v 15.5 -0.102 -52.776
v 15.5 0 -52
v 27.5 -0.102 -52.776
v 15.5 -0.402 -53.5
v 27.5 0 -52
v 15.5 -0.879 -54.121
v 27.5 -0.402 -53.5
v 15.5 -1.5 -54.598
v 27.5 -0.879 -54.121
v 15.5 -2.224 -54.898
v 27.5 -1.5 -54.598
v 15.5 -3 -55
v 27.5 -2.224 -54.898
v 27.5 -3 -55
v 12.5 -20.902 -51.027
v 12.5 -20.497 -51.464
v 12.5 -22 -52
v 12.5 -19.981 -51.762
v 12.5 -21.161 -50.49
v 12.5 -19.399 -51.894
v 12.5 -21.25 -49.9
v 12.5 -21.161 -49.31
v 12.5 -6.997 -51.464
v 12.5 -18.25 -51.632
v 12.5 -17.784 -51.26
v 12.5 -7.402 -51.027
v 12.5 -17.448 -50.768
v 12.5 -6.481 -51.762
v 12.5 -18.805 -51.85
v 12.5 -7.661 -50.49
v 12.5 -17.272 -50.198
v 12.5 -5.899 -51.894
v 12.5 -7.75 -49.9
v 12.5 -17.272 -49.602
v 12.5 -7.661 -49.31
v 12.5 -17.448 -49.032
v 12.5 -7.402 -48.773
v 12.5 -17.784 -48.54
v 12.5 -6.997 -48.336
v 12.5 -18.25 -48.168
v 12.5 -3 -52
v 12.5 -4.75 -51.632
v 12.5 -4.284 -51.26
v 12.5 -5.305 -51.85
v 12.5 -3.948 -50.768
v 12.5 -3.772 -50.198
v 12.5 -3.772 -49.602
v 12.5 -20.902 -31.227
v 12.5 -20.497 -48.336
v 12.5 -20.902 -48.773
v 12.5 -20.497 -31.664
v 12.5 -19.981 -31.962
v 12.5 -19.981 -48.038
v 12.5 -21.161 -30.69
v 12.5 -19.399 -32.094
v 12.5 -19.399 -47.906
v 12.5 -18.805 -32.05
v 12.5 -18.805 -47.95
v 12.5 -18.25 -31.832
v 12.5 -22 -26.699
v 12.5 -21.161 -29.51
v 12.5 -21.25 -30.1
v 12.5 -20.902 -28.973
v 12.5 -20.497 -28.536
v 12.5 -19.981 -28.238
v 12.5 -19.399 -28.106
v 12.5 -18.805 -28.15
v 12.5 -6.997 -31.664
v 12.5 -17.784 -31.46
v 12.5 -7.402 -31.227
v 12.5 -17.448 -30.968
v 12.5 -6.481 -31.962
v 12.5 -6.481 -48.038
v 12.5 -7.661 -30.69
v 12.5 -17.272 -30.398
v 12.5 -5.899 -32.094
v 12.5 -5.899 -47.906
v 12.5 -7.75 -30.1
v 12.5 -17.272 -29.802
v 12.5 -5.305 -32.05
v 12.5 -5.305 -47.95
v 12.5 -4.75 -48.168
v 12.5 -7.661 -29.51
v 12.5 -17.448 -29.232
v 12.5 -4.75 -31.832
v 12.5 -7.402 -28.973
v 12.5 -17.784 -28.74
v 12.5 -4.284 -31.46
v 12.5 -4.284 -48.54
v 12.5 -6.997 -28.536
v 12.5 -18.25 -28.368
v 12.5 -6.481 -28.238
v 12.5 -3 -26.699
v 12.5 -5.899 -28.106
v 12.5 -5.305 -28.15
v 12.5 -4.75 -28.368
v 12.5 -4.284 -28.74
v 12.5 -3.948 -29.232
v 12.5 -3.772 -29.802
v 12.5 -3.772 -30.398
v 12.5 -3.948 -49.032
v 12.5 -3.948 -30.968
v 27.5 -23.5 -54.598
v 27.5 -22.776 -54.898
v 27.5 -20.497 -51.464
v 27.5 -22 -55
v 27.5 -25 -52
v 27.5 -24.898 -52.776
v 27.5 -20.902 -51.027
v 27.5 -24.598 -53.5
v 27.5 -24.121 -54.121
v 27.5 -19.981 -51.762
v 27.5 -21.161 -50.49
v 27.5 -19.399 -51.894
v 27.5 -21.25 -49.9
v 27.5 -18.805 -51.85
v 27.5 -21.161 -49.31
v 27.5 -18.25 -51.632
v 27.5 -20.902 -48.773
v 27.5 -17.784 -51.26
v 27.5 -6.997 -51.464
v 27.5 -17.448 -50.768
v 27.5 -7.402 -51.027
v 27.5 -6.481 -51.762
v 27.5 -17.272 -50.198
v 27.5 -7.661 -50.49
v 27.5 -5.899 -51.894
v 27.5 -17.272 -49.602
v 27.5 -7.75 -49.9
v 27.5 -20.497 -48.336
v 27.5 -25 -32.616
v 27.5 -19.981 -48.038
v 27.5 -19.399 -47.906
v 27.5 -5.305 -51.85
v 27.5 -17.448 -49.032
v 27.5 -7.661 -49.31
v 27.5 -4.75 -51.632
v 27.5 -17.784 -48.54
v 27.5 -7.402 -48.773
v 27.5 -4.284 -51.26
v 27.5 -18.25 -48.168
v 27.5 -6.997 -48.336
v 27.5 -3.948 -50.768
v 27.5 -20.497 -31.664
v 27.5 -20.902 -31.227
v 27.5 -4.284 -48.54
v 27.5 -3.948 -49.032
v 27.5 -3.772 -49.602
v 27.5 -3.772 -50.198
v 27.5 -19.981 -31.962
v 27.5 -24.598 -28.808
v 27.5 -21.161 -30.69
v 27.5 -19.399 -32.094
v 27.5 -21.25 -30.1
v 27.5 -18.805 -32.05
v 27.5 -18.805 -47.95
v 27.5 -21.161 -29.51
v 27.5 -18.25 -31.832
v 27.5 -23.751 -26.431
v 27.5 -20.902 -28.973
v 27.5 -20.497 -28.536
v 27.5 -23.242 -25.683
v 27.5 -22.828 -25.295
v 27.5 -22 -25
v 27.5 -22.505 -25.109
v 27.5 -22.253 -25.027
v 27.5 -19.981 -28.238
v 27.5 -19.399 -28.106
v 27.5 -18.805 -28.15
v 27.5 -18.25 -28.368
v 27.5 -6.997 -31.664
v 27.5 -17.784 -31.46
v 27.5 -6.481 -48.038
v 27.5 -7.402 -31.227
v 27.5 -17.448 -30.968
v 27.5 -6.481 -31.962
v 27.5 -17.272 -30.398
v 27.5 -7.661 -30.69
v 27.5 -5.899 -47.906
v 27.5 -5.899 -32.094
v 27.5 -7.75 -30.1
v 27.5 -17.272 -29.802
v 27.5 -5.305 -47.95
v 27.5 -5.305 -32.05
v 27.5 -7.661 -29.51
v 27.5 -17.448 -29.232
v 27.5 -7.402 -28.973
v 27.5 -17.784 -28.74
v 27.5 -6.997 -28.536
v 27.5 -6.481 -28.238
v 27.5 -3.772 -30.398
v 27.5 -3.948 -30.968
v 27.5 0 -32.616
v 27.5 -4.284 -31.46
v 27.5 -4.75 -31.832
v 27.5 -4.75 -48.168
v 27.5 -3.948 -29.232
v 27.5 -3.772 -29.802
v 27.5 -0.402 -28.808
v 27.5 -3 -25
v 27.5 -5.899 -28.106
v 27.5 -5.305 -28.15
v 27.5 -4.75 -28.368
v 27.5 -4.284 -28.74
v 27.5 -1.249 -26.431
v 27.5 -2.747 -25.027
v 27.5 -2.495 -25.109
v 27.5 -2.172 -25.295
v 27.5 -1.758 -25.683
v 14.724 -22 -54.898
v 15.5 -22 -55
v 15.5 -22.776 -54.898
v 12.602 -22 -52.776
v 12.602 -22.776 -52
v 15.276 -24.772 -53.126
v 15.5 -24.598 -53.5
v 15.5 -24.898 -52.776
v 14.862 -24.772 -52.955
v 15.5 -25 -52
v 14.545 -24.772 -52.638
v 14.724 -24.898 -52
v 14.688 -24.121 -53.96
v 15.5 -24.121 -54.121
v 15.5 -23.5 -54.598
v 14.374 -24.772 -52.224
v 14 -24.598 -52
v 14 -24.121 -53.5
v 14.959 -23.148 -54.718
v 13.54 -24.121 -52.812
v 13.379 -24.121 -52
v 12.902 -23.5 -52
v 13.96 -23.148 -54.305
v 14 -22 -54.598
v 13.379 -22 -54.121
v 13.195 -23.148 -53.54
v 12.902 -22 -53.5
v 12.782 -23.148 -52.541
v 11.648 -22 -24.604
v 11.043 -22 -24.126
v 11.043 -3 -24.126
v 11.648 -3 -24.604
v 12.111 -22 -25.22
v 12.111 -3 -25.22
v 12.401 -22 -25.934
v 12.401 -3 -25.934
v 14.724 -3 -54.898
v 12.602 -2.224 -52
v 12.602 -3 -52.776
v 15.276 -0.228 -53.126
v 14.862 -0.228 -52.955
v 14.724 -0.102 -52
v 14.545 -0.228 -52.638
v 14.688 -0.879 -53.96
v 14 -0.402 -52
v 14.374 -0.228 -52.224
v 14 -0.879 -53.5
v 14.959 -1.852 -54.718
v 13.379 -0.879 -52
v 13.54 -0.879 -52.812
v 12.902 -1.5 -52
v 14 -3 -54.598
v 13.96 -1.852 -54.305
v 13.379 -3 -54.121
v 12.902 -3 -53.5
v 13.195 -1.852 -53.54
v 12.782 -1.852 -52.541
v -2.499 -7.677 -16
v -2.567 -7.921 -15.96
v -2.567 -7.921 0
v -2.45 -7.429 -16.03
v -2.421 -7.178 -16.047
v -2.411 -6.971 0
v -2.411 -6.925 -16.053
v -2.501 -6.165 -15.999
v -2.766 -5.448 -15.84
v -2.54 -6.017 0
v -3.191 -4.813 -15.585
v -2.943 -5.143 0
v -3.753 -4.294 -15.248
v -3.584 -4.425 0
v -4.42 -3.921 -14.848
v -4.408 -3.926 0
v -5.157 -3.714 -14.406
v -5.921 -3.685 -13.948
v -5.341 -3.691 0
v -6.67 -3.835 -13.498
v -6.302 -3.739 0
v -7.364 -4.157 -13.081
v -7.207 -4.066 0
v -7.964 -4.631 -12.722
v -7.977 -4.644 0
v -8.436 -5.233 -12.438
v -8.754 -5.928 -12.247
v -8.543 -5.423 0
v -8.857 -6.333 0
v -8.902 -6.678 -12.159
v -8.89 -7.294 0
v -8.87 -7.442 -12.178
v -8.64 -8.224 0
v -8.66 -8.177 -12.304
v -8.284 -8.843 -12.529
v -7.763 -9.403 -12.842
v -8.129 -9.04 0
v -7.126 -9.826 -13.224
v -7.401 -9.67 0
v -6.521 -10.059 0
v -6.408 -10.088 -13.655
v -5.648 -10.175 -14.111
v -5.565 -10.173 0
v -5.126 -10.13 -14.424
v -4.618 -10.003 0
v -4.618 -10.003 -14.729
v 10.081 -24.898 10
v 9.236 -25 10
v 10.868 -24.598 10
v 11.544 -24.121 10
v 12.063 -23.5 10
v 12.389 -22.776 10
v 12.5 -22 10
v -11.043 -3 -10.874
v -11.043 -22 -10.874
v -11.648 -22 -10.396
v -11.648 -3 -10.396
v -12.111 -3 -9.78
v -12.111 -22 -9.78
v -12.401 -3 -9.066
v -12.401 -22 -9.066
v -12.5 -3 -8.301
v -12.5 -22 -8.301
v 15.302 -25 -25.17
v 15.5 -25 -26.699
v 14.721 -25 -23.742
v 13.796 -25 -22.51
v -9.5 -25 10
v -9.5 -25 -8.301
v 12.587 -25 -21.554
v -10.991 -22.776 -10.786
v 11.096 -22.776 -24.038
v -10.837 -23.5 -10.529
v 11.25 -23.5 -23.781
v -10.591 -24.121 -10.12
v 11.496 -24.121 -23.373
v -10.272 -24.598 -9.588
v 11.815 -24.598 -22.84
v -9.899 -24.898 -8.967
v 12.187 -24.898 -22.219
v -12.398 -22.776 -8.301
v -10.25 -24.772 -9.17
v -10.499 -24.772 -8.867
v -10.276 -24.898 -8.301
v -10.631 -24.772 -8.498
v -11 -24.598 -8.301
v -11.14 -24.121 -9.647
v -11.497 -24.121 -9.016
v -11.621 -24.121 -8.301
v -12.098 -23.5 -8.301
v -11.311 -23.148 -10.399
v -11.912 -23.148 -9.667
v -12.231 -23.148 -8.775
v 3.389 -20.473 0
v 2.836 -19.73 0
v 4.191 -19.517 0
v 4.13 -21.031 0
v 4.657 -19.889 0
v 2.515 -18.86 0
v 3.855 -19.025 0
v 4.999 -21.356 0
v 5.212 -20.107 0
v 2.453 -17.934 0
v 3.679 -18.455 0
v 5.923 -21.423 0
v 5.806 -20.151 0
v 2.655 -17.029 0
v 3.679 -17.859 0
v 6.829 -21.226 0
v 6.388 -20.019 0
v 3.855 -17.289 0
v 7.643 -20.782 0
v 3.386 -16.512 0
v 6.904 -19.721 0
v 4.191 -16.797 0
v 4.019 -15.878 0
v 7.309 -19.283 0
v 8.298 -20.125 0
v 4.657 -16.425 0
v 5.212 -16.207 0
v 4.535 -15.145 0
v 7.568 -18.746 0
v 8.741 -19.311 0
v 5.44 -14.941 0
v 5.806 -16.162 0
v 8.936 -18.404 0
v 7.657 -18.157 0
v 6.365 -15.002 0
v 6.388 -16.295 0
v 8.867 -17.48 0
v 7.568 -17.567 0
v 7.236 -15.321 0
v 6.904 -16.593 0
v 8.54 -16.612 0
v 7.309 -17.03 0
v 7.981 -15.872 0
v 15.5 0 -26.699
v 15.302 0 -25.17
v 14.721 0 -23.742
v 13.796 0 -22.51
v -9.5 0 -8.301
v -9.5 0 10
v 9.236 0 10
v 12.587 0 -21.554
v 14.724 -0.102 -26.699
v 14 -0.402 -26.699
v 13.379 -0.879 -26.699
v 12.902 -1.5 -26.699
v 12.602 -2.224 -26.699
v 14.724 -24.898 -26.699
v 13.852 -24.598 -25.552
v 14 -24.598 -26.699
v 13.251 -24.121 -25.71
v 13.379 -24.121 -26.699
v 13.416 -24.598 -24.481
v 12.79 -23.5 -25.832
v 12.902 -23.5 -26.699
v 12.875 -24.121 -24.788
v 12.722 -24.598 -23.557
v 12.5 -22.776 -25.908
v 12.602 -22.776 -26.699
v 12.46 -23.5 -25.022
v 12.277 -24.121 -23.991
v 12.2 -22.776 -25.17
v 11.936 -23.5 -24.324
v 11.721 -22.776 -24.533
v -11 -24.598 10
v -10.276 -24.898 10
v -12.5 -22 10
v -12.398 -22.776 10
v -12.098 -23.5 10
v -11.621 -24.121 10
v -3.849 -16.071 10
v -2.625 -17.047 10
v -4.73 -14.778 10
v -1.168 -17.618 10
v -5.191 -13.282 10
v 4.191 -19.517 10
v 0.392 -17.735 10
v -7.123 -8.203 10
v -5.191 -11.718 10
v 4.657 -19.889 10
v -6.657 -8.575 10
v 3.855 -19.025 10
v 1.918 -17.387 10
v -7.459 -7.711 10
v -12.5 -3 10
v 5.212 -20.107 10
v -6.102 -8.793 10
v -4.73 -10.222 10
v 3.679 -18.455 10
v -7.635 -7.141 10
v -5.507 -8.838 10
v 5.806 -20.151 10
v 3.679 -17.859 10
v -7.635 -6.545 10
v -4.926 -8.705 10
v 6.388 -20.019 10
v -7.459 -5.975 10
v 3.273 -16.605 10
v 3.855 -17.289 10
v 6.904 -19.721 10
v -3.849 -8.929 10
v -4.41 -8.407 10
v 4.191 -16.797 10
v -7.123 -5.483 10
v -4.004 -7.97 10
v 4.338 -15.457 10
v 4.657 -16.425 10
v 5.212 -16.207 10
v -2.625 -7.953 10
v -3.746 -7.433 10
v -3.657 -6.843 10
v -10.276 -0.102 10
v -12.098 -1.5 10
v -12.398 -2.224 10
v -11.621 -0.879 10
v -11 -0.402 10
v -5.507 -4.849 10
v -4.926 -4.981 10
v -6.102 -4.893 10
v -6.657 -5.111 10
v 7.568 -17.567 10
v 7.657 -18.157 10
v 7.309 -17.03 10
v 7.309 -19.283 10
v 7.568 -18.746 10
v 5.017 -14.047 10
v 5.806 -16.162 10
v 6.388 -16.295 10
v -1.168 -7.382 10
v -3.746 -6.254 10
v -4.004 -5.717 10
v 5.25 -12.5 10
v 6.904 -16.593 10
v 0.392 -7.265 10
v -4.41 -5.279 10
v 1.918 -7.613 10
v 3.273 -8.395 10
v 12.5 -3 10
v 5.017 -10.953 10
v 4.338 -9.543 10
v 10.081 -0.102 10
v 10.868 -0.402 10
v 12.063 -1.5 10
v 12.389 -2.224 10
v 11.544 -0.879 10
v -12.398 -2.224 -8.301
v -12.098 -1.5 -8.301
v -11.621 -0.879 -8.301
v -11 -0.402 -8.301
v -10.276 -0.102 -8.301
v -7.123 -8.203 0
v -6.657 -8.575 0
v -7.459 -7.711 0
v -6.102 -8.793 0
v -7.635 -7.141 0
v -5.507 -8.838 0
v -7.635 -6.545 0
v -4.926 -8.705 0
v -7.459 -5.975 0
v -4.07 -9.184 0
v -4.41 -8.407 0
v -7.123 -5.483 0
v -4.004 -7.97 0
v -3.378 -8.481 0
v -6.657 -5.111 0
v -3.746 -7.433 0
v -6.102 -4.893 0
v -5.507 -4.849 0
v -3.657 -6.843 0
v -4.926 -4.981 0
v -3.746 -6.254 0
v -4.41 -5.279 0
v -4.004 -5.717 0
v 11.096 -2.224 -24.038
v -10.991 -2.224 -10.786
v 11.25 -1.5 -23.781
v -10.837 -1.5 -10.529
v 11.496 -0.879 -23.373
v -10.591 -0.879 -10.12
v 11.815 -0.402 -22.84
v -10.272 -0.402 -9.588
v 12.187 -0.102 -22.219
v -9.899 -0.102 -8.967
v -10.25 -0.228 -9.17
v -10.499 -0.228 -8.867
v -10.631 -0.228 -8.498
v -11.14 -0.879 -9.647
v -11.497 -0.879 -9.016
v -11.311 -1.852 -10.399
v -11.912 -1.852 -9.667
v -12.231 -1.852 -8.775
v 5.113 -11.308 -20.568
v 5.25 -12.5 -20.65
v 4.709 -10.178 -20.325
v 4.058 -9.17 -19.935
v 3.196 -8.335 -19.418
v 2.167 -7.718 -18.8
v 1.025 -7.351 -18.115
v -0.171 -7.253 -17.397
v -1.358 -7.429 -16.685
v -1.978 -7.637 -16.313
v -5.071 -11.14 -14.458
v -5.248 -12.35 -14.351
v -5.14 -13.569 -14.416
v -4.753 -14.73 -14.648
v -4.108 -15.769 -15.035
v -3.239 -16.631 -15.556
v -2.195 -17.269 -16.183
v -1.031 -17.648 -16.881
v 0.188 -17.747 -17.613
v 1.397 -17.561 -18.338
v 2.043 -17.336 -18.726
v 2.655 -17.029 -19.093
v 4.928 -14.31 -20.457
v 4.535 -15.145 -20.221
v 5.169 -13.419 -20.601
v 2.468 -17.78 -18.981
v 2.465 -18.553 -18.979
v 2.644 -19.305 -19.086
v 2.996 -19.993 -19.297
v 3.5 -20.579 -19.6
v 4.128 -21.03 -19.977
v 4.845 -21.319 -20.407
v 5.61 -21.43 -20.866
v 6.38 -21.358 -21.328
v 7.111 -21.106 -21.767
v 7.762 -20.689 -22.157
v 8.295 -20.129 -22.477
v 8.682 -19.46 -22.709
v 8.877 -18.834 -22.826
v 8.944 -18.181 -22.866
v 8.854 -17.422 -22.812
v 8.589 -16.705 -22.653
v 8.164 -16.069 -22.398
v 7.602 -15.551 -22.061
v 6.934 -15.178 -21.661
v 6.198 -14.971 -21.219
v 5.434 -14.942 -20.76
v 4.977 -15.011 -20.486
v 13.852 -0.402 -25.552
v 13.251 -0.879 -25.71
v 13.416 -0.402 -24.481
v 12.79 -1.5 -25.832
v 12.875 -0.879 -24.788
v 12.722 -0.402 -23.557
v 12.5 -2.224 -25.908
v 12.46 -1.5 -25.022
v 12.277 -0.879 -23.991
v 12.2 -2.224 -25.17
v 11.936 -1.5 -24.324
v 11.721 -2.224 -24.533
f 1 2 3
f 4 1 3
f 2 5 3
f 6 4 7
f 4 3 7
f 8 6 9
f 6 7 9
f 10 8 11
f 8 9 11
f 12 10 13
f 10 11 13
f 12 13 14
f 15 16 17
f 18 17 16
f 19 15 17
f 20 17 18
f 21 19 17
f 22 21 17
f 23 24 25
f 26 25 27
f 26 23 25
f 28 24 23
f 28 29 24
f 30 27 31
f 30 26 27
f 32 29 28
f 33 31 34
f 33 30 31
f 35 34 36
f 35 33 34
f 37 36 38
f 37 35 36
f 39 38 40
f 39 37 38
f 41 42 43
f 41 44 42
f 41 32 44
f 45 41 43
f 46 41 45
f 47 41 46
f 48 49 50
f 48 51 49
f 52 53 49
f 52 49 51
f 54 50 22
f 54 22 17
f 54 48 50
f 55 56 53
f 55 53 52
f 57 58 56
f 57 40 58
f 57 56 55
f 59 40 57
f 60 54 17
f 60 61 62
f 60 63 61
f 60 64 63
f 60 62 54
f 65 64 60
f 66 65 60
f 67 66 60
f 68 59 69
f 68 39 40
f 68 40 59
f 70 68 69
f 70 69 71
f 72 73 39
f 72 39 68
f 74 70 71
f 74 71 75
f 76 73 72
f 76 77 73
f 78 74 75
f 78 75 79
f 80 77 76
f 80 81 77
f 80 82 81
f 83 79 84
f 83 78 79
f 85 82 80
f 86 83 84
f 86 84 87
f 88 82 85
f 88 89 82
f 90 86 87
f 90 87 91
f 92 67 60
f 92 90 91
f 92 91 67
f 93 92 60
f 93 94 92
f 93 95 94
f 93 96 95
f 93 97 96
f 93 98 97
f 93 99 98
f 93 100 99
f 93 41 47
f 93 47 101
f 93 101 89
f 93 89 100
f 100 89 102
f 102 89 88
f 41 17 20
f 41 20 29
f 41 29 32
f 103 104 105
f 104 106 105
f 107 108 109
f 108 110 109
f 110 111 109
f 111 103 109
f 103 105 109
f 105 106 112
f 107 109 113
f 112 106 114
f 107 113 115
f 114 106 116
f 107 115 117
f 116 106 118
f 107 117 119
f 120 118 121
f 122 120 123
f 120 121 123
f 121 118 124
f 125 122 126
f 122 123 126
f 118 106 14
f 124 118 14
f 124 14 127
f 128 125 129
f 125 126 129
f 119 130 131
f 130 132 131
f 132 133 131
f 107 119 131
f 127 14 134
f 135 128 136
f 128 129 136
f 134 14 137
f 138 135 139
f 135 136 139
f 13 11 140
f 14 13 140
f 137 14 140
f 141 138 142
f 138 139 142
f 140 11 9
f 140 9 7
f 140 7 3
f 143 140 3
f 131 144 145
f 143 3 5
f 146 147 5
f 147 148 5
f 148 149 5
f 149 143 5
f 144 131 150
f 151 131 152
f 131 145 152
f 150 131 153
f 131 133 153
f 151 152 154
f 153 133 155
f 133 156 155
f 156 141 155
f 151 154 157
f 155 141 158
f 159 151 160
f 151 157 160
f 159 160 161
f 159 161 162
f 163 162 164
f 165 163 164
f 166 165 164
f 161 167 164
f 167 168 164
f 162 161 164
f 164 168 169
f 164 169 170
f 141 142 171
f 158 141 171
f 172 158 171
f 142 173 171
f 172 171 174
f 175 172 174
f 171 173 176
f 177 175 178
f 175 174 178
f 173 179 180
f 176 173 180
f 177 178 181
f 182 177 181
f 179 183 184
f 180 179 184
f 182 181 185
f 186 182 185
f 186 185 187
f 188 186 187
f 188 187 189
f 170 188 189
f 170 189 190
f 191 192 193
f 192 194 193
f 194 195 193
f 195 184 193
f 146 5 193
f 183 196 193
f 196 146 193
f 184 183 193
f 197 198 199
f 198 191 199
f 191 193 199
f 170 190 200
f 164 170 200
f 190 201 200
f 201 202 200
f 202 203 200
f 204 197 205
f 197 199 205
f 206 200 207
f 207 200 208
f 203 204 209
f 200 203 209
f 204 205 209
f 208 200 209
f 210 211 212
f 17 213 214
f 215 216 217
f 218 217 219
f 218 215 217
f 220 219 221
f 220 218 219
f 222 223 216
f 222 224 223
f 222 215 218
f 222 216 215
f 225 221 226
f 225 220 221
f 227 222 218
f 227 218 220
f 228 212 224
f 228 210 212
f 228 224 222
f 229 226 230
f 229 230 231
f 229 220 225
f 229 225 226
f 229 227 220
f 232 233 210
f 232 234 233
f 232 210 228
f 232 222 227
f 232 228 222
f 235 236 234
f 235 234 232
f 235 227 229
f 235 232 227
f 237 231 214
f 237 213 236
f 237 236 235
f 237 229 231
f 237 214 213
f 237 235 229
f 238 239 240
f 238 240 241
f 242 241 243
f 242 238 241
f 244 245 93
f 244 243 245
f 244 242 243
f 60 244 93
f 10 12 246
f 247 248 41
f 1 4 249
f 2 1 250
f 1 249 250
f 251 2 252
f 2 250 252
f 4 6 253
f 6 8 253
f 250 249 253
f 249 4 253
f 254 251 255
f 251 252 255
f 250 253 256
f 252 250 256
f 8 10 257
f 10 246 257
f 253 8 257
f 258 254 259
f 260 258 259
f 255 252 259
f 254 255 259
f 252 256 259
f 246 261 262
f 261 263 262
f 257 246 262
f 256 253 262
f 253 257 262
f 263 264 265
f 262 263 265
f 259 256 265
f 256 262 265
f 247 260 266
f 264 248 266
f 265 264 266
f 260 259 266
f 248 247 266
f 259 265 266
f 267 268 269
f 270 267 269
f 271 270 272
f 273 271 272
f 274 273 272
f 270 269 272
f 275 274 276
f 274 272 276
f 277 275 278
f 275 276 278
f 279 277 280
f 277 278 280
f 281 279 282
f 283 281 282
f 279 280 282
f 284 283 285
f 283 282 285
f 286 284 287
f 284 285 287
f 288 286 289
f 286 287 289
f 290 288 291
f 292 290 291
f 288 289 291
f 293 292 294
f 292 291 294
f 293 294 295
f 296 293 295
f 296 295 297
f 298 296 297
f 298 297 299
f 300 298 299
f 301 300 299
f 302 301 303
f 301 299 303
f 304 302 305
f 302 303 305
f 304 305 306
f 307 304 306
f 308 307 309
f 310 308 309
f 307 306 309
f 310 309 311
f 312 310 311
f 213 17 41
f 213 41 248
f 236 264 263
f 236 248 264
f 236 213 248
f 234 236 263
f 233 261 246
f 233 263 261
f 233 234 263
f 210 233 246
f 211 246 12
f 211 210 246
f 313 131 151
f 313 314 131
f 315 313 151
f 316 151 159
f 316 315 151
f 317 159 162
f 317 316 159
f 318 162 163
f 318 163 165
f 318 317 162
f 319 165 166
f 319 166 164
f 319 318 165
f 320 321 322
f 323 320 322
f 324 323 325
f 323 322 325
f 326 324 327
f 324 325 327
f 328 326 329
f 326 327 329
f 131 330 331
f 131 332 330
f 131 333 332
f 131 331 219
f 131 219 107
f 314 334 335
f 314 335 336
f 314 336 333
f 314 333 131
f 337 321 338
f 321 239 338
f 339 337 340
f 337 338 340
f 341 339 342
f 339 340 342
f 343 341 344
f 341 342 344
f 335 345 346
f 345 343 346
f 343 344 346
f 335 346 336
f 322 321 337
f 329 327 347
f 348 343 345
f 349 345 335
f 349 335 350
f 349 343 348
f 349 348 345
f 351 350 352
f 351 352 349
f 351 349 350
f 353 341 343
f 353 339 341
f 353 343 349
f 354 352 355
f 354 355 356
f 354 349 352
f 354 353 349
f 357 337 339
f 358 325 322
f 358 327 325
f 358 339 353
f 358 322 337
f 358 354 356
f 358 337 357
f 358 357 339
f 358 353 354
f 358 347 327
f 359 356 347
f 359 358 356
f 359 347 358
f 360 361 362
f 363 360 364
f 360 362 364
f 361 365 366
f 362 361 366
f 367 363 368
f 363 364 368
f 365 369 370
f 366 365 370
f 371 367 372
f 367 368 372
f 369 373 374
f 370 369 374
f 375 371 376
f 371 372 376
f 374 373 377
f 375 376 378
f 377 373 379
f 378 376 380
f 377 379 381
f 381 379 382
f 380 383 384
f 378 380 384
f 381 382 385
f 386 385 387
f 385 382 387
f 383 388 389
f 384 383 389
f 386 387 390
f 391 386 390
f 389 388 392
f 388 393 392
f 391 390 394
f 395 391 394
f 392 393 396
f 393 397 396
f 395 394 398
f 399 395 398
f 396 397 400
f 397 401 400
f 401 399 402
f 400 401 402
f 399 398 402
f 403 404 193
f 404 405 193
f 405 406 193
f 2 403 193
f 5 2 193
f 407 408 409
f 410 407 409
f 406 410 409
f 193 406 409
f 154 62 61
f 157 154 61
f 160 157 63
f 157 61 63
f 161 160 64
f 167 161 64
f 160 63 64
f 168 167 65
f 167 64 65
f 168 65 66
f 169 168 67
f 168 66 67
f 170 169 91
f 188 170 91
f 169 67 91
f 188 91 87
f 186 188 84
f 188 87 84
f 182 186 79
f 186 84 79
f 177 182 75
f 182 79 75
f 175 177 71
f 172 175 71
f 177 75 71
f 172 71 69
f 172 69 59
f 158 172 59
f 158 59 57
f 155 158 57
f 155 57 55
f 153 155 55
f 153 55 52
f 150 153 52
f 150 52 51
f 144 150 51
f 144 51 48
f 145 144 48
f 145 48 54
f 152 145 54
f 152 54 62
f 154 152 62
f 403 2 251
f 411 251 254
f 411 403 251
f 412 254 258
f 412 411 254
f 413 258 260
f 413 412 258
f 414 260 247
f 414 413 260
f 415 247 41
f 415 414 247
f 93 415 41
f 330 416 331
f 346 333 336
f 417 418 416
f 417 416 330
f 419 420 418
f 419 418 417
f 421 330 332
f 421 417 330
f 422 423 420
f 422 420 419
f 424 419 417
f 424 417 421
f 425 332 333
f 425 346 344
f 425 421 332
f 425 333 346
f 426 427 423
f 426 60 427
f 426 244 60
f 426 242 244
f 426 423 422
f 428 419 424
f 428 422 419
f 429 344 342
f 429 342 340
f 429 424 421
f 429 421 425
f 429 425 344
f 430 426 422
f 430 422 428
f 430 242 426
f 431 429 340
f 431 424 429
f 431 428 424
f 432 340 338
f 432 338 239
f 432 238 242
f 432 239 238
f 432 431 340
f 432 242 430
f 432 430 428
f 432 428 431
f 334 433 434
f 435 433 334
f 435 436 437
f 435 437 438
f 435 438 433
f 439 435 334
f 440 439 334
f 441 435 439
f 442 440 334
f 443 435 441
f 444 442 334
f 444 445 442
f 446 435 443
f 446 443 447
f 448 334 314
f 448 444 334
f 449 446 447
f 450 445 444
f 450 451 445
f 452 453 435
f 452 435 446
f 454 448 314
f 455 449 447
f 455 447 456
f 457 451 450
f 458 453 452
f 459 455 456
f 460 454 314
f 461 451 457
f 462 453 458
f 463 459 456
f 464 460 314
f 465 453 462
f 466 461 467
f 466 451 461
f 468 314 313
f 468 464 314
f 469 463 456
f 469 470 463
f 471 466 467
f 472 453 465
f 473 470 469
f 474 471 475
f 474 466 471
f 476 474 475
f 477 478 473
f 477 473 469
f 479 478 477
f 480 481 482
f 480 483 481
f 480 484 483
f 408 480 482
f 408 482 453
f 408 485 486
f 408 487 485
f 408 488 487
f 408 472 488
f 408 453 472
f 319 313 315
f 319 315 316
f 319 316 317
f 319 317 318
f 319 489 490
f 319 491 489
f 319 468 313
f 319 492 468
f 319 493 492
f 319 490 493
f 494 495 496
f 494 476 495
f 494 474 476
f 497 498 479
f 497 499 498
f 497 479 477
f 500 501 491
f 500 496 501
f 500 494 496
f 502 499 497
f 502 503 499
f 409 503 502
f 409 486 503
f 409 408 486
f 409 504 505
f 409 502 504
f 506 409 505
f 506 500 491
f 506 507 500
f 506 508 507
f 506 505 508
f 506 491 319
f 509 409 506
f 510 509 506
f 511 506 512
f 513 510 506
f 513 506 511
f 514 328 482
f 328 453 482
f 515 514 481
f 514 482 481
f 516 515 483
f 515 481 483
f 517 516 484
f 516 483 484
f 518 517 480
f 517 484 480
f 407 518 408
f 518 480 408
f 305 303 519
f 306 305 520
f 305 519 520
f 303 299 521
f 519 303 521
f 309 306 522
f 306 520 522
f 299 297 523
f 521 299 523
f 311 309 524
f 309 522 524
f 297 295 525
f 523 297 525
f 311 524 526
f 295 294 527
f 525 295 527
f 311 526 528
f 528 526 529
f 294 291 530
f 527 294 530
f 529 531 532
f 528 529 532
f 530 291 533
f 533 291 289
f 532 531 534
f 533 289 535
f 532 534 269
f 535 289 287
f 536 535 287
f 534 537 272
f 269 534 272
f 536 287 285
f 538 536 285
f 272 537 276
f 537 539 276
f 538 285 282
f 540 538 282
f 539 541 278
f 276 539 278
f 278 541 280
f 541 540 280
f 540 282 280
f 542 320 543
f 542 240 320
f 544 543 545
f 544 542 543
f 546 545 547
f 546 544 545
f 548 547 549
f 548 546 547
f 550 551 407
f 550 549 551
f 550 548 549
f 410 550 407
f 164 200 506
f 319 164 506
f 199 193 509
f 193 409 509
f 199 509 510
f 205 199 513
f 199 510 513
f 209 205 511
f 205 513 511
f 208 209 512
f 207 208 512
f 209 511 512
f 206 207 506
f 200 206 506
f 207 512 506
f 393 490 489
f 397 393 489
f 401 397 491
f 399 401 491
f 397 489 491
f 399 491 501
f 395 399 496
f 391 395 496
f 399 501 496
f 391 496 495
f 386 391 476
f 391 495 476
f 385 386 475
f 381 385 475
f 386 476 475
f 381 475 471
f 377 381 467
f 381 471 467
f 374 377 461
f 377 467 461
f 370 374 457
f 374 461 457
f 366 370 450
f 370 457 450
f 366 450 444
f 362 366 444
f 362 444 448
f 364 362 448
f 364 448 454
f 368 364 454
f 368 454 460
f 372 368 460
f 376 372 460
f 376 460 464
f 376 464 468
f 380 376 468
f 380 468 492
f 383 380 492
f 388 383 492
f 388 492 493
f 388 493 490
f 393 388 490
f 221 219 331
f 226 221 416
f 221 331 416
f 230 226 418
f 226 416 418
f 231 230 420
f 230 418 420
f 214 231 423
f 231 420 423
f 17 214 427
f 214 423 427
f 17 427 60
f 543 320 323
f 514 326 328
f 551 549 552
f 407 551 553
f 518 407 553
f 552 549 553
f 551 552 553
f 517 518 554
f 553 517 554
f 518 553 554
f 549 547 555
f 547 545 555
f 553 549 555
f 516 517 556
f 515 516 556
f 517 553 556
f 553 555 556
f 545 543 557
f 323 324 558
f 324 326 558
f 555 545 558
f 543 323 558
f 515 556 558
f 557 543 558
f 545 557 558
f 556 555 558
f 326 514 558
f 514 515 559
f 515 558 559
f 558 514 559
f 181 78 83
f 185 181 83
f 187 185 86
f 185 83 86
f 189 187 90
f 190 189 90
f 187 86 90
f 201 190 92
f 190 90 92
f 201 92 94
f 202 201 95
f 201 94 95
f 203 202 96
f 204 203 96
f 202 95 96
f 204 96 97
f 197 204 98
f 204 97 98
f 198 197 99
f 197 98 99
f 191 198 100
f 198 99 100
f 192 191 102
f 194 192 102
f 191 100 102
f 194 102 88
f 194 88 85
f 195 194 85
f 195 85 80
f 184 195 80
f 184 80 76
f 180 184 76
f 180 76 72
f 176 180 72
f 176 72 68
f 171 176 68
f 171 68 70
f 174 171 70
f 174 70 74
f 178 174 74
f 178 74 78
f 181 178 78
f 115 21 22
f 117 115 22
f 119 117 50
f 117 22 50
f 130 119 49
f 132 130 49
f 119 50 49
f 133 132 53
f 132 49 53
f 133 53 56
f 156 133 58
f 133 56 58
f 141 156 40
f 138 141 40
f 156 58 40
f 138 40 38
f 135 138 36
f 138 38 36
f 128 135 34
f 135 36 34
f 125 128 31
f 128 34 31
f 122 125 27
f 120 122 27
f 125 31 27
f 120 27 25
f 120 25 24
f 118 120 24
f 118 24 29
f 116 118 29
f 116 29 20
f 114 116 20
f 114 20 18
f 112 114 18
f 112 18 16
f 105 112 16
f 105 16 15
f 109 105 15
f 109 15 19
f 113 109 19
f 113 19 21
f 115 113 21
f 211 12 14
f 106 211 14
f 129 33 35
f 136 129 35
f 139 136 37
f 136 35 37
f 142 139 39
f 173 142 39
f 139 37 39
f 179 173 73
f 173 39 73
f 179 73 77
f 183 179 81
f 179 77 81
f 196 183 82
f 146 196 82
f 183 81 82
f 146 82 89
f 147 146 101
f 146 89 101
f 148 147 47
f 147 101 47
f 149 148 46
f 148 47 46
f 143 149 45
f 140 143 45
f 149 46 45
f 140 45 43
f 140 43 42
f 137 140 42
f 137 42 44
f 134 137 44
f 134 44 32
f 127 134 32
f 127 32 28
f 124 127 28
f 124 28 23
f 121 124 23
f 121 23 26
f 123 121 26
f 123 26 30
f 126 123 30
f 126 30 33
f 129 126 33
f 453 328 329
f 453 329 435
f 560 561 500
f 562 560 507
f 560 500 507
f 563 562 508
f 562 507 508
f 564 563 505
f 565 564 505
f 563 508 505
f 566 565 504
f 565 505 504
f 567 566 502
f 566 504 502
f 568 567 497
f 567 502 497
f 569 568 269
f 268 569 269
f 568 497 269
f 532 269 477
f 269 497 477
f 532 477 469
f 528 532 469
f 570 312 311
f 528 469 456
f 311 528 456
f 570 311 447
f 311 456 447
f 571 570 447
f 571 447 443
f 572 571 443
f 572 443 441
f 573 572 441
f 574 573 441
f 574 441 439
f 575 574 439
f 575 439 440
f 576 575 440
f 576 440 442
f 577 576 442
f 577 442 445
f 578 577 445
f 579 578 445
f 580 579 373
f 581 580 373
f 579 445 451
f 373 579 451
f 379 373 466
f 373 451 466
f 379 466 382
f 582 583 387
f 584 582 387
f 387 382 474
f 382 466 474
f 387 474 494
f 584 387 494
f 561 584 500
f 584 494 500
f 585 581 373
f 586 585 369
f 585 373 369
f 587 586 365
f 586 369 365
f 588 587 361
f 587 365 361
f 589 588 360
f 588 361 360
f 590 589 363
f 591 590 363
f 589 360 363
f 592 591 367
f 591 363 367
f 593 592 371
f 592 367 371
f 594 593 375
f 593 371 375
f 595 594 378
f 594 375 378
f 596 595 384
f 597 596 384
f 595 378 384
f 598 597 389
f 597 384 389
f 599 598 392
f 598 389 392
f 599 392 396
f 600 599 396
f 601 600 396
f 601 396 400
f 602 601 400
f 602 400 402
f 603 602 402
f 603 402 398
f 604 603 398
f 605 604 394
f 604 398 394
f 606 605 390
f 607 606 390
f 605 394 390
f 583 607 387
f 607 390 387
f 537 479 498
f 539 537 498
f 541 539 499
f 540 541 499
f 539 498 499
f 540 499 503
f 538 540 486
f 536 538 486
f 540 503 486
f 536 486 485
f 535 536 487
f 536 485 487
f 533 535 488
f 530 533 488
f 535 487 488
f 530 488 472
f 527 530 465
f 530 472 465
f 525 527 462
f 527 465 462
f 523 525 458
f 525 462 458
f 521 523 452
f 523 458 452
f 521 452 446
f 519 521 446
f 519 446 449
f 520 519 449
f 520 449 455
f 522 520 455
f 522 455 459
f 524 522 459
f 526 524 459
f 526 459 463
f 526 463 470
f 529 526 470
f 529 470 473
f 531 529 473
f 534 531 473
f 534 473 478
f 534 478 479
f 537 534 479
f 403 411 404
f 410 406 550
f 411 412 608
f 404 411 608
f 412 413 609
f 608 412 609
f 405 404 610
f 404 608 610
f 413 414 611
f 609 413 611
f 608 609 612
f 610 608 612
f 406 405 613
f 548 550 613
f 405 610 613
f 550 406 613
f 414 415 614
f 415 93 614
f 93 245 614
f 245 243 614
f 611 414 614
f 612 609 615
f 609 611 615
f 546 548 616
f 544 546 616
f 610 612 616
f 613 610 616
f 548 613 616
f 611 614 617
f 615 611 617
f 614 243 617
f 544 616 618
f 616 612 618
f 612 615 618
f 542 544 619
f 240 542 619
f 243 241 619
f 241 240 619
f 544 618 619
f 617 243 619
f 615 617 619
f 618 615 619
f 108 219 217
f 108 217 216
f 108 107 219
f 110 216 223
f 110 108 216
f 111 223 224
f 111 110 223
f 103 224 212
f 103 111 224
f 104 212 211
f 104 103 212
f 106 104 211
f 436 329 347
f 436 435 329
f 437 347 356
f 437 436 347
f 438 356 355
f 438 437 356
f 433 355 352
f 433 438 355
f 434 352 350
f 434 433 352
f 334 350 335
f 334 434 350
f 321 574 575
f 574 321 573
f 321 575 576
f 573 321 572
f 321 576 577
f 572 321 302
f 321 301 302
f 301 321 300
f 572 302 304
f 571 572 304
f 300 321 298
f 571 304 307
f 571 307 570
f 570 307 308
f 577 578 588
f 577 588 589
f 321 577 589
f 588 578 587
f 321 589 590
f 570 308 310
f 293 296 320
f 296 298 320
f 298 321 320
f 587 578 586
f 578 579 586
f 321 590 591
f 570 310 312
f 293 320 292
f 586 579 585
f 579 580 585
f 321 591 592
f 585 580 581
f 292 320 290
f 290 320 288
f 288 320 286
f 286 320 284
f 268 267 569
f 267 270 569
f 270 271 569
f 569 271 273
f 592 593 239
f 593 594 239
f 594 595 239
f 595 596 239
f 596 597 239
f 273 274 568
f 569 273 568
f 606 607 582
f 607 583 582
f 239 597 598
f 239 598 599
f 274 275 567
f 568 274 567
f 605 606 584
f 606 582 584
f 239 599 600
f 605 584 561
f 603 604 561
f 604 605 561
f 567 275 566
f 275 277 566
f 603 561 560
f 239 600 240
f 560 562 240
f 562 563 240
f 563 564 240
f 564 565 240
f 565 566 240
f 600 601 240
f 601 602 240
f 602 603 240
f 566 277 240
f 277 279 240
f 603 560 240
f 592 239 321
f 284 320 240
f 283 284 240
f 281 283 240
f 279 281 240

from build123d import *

# Parameters (mm, degrees)
F0_W      = 25
F0_H      = 20
F0_W_2    = 15
F0_H_2    = 30
F1_DEPTH  = 25
F2_R      = 5.25
F3_DEPTH  = 65.001
F4_R      = 2
F5_DEPTH  = 25
F6_R      = 3
F7_R      = 2
F8_DEPTH  = 65.001
F9_R      = 3.25
F10_DEPTH = 55.001


with BuildPart() as f1:
    # F0 (on Front) → F1 (new body)
    with BuildSketch(Plane.XZ):
        Polygon((12.5, 10), (12.5, -10), (-12.5, -10), (12.5, -25), (27.5, -25), align=None)
        Rectangle(F0_W, F0_H)
        with Locations((20, -40)):
            Rectangle(F0_W_2, F0_H_2)
    extrude(amount=F1_DEPTH)

    # F2 (on face) → F3 (cut, through all)
    with BuildSketch(Plane.XY.offset(10)):
        with Locations((0, -12.5)):
            Circle(F2_R)
    extrude(amount=-F3_DEPTH, mode=Mode.SUBTRACT)

    # F4 (on face) → F5 (cut)
    with BuildSketch(Plane(origin=(12.5, 0, 0), x_dir=(0, -1, 0), z_dir=(-1, 0, 0))):
        with Locations((19.25, -30.1)):
            Circle(F4_R)
        with Locations((5.75, -49.9)):
            Circle(F4_R)
        with Locations((5.75, -30.1)):
            Circle(F4_R)
        with Locations((19.25, -49.9)):
            Circle(F4_R)
    extrude(amount=-F5_DEPTH, mode=Mode.SUBTRACT)

    # F6
    f6_edges = [f1.edges().sort_by_distance(p)[0] for p in [
        (-12.5, -25, 0),
        (-12.5, 0, 0),
        (-12.5, -12.5, -10),
        (0, -25, -17.5),
        (0, 0, -17.5),
        (12.5, -12.5, -25),
        (12.5, -12.5, -55),
        (20, -25, -7.5),
        (20, 0, -7.5),
        (20, -25, -55),
        (20, 0, -55),
        (12.5, 0, -40),
        (12.5, -25, -40),
    ]]
    fillet(f6_edges, radius=F6_R)

    # F7 (on face) → F8 (cut, through all)
    with BuildSketch(Plane.XY.offset(10)):
        with Locations((-5.6568542495, -6.8431457505)):
            Circle(F7_R)
        with Locations((5.6568542495, -18.1568542495)):
            Circle(F7_R)
    extrude(amount=-F8_DEPTH, mode=Mode.SUBTRACT)

    # F9 (on Top) → F10 (cut, through all)
    with BuildSketch(Plane.XY):
        with Locations((-5.6611075997, -6.9247833453)):
            Circle(F9_R)
        with Locations((5.6935697794, -18.1814264506)):
            Circle(F9_R)
    extrude(amount=-F10_DEPTH, mode=Mode.SUBTRACT)


solid = f1.part
